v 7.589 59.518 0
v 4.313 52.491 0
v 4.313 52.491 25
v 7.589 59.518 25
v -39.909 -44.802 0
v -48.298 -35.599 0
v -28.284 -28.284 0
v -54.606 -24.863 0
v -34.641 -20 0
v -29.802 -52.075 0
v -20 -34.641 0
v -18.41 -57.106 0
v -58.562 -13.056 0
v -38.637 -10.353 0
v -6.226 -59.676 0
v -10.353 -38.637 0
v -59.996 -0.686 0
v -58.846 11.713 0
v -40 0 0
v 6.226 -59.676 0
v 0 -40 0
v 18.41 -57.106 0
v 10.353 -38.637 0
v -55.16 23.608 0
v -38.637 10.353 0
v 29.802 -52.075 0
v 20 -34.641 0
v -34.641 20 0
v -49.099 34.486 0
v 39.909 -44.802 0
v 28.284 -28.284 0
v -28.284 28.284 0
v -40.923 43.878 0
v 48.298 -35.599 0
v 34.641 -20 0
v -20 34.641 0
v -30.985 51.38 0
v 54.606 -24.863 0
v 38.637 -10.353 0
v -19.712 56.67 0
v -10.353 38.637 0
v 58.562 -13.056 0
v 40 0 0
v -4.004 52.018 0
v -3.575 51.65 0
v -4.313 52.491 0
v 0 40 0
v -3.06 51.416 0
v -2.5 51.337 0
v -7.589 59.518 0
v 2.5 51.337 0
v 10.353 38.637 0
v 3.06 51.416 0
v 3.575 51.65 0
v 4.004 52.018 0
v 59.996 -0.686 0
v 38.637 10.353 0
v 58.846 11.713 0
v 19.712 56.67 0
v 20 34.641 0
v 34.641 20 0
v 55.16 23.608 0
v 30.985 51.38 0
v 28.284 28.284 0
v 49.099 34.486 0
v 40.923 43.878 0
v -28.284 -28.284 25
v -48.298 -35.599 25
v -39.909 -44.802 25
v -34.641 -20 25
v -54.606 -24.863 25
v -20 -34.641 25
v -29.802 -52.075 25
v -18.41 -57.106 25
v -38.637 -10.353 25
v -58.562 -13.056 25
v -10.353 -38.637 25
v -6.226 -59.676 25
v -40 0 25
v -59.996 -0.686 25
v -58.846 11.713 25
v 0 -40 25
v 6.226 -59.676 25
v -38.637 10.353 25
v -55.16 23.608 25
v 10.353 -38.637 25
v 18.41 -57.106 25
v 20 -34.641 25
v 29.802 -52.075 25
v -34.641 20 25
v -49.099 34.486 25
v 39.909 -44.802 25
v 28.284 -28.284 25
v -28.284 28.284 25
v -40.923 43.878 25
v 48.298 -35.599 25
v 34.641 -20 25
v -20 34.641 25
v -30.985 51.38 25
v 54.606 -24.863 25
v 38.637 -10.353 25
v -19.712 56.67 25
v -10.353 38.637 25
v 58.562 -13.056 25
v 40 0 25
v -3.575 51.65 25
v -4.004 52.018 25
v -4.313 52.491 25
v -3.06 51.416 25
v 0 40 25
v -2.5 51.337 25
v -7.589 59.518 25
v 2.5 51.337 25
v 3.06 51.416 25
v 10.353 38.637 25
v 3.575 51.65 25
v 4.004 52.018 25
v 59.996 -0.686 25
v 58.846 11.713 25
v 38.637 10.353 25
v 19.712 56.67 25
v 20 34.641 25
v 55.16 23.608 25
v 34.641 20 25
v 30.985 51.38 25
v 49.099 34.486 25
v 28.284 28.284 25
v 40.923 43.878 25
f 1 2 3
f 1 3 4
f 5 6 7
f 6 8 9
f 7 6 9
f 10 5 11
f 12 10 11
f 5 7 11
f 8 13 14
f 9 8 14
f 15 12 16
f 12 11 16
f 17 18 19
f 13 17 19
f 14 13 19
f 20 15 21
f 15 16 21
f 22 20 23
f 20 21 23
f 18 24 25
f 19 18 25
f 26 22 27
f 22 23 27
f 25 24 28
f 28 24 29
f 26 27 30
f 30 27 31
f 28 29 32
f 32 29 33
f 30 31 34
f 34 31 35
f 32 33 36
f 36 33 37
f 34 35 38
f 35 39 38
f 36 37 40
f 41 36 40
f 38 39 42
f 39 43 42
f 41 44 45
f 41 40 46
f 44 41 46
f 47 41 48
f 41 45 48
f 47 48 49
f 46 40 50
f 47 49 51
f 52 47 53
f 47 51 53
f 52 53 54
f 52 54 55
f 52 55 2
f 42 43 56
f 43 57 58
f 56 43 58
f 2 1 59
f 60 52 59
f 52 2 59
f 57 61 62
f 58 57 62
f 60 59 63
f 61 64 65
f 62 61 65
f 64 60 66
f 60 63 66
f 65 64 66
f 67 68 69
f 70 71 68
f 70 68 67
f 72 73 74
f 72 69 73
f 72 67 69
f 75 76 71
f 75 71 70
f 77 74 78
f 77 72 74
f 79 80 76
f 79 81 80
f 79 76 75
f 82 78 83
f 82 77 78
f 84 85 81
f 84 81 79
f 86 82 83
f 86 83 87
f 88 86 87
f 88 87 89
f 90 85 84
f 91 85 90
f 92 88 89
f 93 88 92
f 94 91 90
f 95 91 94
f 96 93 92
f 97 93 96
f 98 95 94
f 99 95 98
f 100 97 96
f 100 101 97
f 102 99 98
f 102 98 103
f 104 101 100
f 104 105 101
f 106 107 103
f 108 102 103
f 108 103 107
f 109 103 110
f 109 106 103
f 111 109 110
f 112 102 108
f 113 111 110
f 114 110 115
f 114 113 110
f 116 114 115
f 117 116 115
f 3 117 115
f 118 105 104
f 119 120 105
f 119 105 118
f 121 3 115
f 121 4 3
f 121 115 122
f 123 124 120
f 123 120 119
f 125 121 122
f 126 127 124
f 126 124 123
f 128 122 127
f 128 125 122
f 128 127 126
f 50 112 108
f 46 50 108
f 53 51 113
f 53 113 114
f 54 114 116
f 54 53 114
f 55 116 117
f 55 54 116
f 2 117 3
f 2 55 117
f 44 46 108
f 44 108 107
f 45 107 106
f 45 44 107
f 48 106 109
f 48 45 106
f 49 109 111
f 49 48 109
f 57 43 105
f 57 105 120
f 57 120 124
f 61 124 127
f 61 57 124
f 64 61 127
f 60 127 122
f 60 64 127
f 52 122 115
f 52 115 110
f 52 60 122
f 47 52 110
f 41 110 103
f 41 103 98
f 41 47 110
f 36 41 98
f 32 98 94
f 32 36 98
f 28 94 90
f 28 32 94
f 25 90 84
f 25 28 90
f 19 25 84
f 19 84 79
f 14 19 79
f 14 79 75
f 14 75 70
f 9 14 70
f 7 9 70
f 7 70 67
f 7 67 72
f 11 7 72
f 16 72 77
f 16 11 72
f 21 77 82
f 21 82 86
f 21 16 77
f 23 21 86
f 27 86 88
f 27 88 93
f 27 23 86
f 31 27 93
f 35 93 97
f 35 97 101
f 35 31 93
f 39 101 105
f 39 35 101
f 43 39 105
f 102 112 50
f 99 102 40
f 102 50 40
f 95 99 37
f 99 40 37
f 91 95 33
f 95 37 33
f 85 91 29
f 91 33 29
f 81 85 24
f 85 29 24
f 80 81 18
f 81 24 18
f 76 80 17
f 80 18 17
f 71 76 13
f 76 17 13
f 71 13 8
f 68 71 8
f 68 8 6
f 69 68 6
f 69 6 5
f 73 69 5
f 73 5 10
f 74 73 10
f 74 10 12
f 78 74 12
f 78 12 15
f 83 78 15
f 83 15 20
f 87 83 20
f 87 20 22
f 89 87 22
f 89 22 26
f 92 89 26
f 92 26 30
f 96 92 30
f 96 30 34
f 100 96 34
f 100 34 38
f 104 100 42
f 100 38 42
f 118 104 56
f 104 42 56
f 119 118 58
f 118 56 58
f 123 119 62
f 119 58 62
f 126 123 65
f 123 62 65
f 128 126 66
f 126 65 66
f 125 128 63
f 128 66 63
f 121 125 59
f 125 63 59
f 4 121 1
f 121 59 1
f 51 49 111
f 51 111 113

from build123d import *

# Parameters (mm, degrees)
F0_R     = 60
F0_R_2   = 40
F1_DEPTH = 25
F4_DEPTH = 25.001


with BuildPart() as f1:
    # F0 (on Top) → F1 (new body)
    with BuildSketch(Plane.XY):
        Circle(F0_R)
        Circle(F0_R_2, mode=Mode.SUBTRACT)
    extrude(amount=F1_DEPTH)

    # F3 (on Top) + F2 (on face) → F4 (cut, through all)
    with BuildSketch(Plane.XY):
        with BuildLine():
            ThreePointArc((7.58927, 59.51809), (0, 60.215254), (-7.58927, 59.51809))
            Line((-7.58927, 59.51809), (-4.312616, 52.491282))
            ThreePointArc((-4.312616, 52.491282), (-3.574599, 51.649735), (-2.5, 51.336518))
            Line((-2.5, 51.336518), (2.5, 51.336518))
            ThreePointArc((2.5, 51.336518), (3.574599, 51.649735), (4.312616, 52.491282))
            Line((4.312616, 52.491282), (7.58927, 59.51809))
        make_face()
    with BuildSketch(Plane(origin=(0, 0, 0), x_dir=(1, 0, 0), z_dir=(0, 0, -1))):
        with BuildLine():
            Line((-3.065543, -69.518532), (0, -60))
            ThreePointArc((0, -60), (-11.359106, -58.914945), (-22.307369, -55.699024))
            Line((-22.307369, -55.699024), (-22.307369, -65.699024))
            ThreePointArc((-22.307369, -65.699024), (-14.254384, -75.507649), (-3.065543, -69.518532))
        make_face()
    extrude(amount=F4_DEPTH, mode=Mode.SUBTRACT)


solid = f1.part
